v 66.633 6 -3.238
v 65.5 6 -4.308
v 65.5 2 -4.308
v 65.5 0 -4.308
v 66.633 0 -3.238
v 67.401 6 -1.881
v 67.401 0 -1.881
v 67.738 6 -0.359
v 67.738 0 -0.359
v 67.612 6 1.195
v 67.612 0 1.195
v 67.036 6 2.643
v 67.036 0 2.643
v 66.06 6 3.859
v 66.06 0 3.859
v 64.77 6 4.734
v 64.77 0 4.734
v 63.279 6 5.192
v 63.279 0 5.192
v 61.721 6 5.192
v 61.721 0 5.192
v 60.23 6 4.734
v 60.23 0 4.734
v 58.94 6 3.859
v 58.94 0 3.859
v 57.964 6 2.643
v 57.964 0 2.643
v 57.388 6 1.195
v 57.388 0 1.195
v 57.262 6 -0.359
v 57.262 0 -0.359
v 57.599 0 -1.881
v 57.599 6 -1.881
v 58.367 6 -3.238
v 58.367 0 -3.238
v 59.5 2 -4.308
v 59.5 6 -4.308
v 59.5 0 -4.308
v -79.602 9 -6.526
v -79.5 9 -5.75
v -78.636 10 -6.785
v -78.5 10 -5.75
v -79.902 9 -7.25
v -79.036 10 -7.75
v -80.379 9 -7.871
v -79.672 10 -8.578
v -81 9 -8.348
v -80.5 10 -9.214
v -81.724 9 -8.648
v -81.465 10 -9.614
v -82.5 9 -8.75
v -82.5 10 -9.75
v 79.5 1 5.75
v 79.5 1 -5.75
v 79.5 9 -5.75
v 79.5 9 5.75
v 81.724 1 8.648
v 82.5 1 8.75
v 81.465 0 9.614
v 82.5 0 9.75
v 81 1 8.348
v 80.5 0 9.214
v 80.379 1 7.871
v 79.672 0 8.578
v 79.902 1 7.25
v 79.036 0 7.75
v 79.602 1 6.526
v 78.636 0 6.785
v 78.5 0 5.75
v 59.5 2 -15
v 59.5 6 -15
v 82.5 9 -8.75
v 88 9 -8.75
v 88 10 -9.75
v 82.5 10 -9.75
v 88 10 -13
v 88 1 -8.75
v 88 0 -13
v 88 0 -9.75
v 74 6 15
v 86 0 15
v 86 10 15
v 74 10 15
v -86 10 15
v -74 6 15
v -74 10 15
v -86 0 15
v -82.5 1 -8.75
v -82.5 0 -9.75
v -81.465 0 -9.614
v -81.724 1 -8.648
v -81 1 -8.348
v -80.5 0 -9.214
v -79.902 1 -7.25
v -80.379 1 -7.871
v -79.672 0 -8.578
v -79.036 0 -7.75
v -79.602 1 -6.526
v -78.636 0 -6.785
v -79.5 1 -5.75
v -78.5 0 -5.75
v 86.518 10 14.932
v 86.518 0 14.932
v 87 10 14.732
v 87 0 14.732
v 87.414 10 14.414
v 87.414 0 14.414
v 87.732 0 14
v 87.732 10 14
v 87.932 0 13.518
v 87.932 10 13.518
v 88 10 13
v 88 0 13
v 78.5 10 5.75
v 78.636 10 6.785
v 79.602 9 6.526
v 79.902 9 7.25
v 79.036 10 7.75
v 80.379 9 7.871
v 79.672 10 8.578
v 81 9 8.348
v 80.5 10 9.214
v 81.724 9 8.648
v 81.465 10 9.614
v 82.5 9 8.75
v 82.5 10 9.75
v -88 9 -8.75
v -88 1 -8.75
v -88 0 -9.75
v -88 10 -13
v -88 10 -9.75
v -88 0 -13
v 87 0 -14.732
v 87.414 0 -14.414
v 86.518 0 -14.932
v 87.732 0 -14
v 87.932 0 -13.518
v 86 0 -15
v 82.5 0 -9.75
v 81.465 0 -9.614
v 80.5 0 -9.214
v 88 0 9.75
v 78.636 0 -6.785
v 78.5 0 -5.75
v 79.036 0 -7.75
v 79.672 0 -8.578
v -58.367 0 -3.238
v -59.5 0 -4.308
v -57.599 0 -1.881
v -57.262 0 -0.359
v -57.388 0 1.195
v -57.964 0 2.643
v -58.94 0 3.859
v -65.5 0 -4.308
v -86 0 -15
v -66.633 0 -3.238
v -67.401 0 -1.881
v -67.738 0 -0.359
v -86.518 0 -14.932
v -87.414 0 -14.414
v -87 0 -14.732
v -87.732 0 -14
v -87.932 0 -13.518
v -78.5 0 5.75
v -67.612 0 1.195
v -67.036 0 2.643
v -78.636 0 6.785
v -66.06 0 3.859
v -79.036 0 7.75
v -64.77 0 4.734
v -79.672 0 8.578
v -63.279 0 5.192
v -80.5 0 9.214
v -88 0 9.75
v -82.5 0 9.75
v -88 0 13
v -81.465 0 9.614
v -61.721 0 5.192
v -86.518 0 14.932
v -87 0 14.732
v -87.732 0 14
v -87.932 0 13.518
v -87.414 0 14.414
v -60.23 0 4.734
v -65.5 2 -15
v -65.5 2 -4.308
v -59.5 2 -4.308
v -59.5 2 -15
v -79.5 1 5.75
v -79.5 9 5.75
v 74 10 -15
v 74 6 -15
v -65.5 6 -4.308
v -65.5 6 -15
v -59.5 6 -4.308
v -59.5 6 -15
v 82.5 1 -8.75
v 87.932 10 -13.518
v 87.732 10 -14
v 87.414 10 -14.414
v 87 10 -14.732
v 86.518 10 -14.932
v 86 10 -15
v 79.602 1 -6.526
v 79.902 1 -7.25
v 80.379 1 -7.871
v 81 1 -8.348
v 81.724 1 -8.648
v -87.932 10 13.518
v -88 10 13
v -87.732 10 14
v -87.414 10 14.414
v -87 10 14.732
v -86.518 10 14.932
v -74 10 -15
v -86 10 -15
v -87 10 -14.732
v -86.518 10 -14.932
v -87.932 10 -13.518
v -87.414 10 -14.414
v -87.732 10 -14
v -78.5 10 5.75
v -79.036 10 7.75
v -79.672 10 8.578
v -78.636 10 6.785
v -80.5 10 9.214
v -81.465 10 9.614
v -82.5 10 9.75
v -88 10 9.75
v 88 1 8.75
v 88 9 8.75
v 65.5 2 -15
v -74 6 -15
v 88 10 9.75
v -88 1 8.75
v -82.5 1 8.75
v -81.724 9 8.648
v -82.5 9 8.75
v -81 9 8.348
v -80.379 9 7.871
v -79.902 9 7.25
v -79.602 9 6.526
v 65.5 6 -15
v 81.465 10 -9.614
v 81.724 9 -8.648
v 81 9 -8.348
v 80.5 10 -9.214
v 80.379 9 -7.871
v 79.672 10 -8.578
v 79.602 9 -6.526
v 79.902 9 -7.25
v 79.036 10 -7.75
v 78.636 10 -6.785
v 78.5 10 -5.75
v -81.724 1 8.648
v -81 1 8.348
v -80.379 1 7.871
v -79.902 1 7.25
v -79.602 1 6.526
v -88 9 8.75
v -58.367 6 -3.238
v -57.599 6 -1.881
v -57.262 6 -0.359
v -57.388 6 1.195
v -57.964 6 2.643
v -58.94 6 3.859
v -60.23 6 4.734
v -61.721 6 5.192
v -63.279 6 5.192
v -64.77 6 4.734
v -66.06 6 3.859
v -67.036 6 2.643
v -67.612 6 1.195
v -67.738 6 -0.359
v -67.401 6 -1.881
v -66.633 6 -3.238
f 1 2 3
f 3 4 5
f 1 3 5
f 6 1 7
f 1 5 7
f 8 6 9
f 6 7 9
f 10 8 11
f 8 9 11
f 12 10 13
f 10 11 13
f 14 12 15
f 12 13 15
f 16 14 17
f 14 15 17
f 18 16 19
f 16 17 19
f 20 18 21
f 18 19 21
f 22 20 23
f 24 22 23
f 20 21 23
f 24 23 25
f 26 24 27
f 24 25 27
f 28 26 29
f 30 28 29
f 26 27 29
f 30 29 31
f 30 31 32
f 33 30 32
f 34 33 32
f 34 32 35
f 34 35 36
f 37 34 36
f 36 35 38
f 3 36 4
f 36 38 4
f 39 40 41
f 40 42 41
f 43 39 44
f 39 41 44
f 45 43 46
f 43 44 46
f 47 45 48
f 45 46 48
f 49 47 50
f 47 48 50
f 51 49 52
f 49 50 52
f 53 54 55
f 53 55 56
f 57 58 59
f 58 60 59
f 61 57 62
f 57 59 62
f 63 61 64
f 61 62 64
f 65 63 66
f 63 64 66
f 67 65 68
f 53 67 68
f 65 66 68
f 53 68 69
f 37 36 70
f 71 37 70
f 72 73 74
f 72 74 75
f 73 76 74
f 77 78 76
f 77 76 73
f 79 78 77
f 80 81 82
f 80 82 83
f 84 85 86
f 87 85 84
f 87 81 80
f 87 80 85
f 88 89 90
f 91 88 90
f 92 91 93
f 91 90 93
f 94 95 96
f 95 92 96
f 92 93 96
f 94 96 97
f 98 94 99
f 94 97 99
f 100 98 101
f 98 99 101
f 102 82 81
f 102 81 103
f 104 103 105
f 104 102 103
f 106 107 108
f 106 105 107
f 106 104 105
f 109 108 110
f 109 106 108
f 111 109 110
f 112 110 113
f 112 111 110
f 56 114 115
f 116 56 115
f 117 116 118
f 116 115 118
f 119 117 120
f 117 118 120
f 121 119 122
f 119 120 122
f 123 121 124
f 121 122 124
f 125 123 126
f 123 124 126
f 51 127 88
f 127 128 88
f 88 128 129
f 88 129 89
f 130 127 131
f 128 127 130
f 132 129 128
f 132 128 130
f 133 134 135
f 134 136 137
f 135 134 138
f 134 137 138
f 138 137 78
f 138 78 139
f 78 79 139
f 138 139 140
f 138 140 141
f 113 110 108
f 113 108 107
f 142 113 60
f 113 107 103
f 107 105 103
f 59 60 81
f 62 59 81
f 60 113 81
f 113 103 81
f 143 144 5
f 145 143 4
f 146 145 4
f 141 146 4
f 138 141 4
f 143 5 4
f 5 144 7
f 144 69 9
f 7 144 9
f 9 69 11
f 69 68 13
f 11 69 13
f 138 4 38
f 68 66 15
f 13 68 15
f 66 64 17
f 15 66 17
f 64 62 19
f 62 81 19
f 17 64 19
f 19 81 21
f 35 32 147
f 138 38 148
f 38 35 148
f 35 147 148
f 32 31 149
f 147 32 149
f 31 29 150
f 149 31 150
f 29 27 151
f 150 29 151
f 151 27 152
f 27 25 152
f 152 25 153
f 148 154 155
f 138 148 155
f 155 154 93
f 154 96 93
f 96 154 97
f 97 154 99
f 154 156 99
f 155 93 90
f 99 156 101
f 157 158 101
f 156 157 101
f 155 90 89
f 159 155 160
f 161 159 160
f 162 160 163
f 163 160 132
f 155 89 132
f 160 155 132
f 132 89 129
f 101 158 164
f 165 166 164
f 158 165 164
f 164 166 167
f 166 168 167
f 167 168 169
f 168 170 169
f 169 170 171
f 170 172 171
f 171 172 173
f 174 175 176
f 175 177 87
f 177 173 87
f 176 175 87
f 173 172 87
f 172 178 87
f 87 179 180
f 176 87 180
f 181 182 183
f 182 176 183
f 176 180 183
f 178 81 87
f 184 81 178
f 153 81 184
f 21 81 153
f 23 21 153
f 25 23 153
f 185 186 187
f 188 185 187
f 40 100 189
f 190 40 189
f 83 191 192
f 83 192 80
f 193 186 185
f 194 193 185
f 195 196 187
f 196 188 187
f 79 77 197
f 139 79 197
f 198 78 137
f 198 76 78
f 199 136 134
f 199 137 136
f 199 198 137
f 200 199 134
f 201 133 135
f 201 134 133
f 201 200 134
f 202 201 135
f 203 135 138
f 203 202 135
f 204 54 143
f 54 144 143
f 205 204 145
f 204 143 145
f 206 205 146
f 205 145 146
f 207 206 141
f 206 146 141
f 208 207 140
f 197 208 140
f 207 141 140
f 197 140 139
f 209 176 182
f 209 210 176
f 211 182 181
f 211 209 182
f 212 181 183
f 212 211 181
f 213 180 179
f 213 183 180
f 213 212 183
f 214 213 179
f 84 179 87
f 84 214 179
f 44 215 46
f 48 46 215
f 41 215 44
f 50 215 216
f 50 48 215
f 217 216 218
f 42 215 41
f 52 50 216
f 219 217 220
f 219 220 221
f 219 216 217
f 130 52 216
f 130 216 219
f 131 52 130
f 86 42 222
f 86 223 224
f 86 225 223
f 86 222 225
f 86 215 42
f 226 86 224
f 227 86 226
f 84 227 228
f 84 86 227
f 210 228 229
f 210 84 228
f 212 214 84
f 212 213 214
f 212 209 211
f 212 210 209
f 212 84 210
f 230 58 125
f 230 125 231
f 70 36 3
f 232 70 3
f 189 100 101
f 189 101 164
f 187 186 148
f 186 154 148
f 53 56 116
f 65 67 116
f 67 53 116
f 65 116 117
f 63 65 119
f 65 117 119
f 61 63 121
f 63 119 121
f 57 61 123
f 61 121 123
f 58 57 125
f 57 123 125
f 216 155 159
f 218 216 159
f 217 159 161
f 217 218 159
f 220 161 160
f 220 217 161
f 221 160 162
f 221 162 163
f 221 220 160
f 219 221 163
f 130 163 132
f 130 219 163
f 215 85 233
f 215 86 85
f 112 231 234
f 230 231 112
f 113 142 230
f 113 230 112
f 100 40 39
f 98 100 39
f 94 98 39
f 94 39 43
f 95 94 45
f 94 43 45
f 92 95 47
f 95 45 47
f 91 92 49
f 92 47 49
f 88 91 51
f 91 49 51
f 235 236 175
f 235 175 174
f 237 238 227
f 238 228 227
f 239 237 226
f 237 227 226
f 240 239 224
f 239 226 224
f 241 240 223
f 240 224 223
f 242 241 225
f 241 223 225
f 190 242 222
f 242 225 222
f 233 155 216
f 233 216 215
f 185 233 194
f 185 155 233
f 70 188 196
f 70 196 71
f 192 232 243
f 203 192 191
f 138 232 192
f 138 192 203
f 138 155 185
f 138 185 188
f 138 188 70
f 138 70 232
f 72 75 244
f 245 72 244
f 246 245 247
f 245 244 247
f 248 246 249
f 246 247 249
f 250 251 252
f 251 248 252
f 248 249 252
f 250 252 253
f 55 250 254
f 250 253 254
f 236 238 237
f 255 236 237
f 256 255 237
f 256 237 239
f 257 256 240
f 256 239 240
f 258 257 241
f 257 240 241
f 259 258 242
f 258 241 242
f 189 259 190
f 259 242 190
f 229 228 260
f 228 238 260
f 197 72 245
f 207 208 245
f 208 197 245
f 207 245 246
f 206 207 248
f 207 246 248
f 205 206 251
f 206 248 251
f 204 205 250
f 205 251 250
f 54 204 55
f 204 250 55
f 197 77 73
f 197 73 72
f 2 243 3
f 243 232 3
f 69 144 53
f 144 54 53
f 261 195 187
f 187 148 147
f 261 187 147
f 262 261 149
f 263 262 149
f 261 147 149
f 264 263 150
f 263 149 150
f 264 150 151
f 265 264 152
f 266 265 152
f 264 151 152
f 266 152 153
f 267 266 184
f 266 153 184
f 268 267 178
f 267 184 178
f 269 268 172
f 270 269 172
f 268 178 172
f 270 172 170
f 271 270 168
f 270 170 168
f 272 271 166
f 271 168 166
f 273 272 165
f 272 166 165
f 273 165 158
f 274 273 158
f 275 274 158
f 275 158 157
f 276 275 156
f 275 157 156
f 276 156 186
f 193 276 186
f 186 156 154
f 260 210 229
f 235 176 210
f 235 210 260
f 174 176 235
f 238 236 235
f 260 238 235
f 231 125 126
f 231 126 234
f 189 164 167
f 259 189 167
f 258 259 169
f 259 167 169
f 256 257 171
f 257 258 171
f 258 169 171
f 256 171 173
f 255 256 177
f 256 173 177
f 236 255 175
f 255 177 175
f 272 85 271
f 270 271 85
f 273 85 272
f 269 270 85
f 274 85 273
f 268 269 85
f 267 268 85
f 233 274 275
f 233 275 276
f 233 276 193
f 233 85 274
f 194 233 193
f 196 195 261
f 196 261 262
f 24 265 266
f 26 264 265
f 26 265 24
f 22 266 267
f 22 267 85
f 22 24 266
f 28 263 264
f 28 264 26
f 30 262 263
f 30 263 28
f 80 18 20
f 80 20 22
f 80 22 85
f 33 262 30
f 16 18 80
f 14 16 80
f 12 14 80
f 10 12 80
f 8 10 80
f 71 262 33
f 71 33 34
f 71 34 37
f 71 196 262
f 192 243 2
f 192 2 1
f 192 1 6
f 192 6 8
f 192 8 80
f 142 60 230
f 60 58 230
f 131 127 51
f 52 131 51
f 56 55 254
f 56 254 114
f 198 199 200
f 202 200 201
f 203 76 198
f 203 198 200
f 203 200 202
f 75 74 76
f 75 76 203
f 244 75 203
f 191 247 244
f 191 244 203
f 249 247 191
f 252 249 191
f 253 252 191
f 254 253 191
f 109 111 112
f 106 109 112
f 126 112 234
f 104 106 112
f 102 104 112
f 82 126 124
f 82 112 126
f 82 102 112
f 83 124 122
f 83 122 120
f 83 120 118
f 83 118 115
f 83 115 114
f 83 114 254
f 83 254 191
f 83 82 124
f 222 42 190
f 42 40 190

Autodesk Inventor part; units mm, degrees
ref_plane "YZ Plane" through (0, 0, 0) normal (1, 0, 0) x (0, 1, 0)
ref_plane "XZ Plane" through (0, 0, 0) normal (0, 1, 0) x (-1, 0, 0)
ref_plane "XY Plane" through (0, 0, 0) normal (0, 0, 1) x (1, 0, 0)
sketch "Body Outline" plane through (0, 0, 0) normal (0, 1, 0) x (-1, 0, 0)
  line L0 (88, -15) -> (-88, -15)
  line L1 (-88, -15) -> (-88, 15)
  line L2 (-88, 15) -> (88, 15)
  line L3 (88, 15) -> (88, -15)
  point P0 (0, 0)
  dimension "d0" = 30
  dimension "d1" = 15
  dimension "d2" = 176
  dimension "d3" = 88
extrude "Body" add sketch "Body Outline" along normal blind 10
sketch "Body Cutout Outline" plane through (0, 10, 0) normal (0, 1, 0) x (1, 0, 0)
  line L0 (-74, 15) -> (74, 15)
  line L1 (74, 15) -> (74, -15)
  line L2 (74, -15) -> (-74, -15)
  line L3 (-74, -15) -> (-74, 15)
  line L4 (-88, 15) -> (-88, -15) projected
  line L5 (88, -15) -> (88, 15) projected
  line L6 (88, 15) -> (-88, 15) projected
  line L7 (-88, -15) -> (88, -15) projected
  point P0 (0, 0)
  dimension "d6" = 14
  dimension "d7" = 14
  dimension "d8" = 0
  dimension "d9" = 0
extrude "Body Cutout" cut sketch "Body Cutout Outline" against normal blind 4 contours L0 L1 L2 L3
sketch "Rail Cutouts Outline" plane through (0, 0, 0) normal (0, -1, 0) x (1, 0, 0)
  line L0 (99.5, -8.75) -> (79.5, -8.75)
  line L1 (79.5, -8.75) -> (79.5, 8.75)
  line L2 (79.5, 8.75) -> (99.5, 8.75)
  line L3 (99.5, 8.75) -> (99.5, -8.75)
  line L4 (88, -15) -> (88, 15) projected
  line L5 (-99.5, -8.75) -> (-79.5, -8.75)
  line L6 (-79.5, -8.75) -> (-79.5, 8.75)
  line L7 (-79.5, 8.75) -> (-99.5, 8.75)
  line L8 (-99.5, 8.75) -> (-99.5, -8.75)
  line L9 (-88, 15) -> (-88, -15) projected
  point P0 (0, 0)
  dimension "d12" = 8.5
  dimension "d13" = 17.5
  dimension "d14" = 8.75
  dimension "d16" = 8.5
  dimension "d17" = 20
  dimension "d18" = 20
  dimension "d19" = 17.5
  dimension "d20" = 8.75
extrude "Rail Cutouts" cut sketch "Rail Cutouts Outline" along normal through all both and the other way through all
sketch "Spigot Cutouts Outline" plane through (0, 6, 0) normal (0, 1, 0) x (1, 0, 0)
  arc A0 (-65.5, 4.3084) -> (-59.5, 4.3084) centre (-62.5, 0) ccw
  line L0 (-65.5, 15) -> (-59.5, 15)
  line L1 (-59.5, 15) -> (-59.5, 4.3084)
  line L2 (-65.5, 4.3084) -> (-65.5, 15)
  line L3 (-74, 15) -> (74, 15) projected
  arc A1 (59.5, 4.3084) -> (65.5, 4.3084) centre (62.5, 0) ccw
  line L4 (59.5, 15) -> (65.5, 15)
  line L5 (65.5, 15) -> (65.5, 4.3084)
  line L6 (59.5, 4.3084) -> (59.5, 15)
  point P0 (0, 0)
  dimension "d23" = 6
  dimension "d24" = 62.5
  dimension "d25" = 0
  dimension "d26" = 0
  dimension "d27" = 5.25
  dimension "d28" = 3
  dimension "d29" = 6
  dimension "d30" = 3
  dimension "d31" = 5.25
  dimension "d32" = 0
  dimension "d33" = 0
  dimension "d34" = 62.5
extrude "Spigot Cutouts" cut sketch "Spigot Cutouts Outline" along normal through all both and the other way through all
sketch "Spigot Supports Outline" plane through (0, 0, 0) normal (0, -1, 0) x (1, 0, 0)
  line L0 (-65.5, -4.3084) -> (-59.5, -4.3084)
  line L1 (-59.5, -4.3084) -> (-59.5, -15)
  line L2 (-59.5, -15) -> (-65.5, -15)
  line L3 (-65.5, -15) -> (-65.5, -4.3084)
  line L4 (-65.5, -15) -> (-65.5, -4.3084) projected
  line L5 (-59.5, -4.3084) -> (-59.5, -15) projected
  line L6 (-88, -15) -> (-65.5, -15) projected
  line L7 (59.5, -4.3084) -> (65.5, -4.3084)
  line L8 (65.5, -4.3084) -> (65.5, -15)
  line L9 (65.5, -15) -> (59.5, -15)
  line L10 (59.5, -15) -> (59.5, -4.3084)
  line L11 (65.5, -4.3084) -> (65.5, -15) projected
  line L12 (59.5, -15) -> (59.5, -4.3084) projected
  line L13 (-59.5, -15) -> (59.5, -15) projected
  point P0 (0, 0)
  dimension "d37" = 0
  dimension "d38" = 0
  dimension "d39" = 0
  dimension "d40" = 0
  dimension "d41" = 0
  dimension "d42" = 0
  dimension "d43" = 0
  dimension "d44" = 0
extrude "Spigot Supports" add sketch "Spigot Supports Outline" against normal blind 2
fillet "Body Fillet" radius 3 4 edges at (-79.5, 5, -8.75) (-79.5, 5, 8.75) (79.5, 5, -8.75) (79.5, 5, 8.75)
fillet "Body Fillet" radius 2 4 edges at (-88, 5, 15) (-88, 5, -15) (88, 5, -15) (88, 5, 15)
chamfer "Rail Cutouts Chamfer" distance 1 angle 45 20 edges at (-85.25, 10, -8.75) (-80.3787, 10, -7.8713) (-79.5, 10, 0) (-80.3787, 10, 7.8713) (-85.25, 10, 8.75) (-85.25, 0, -8.75) (-80.3787, 0, -7.8713) (-79.5, 0, 0) (-80.3787, 0, 7.8713) (-85.25, 0, 8.75) (85.25, 10, -8.75) (80.3787, 10, -7.8713) (79.5, 10, 0) (80.3787, 10, 7.8713) (85.25, 10, 8.75) (85.25, 0, 8.75) (80.3787, 0, 7.8713) (79.5, 0, 0) (80.3787, 0, -7.8713) (85.25, 0, -8.75)
equation "\"d1\" = 0.5 * d0"
equation "\"d3\" = 0.5 * d2"
equation "\"d7\" = d6"
equation "\"d14\" = 0.5 * d13"
equation "\"d16\" = d12"
equation "\"d18\" = d17"
equation "\"d19\" = d13"
equation "\"d20\" = 0.5 * d19"
equation "\"d28\" = 0.5 * d23"
equation "\"d29\" = d23"
equation "\"d30\" = d28"
equation "\"d31\" = d27"
equation "\"d34\" = d24"
properties part number "LR Spigot Plate" material "Acetal Resin, Black"
